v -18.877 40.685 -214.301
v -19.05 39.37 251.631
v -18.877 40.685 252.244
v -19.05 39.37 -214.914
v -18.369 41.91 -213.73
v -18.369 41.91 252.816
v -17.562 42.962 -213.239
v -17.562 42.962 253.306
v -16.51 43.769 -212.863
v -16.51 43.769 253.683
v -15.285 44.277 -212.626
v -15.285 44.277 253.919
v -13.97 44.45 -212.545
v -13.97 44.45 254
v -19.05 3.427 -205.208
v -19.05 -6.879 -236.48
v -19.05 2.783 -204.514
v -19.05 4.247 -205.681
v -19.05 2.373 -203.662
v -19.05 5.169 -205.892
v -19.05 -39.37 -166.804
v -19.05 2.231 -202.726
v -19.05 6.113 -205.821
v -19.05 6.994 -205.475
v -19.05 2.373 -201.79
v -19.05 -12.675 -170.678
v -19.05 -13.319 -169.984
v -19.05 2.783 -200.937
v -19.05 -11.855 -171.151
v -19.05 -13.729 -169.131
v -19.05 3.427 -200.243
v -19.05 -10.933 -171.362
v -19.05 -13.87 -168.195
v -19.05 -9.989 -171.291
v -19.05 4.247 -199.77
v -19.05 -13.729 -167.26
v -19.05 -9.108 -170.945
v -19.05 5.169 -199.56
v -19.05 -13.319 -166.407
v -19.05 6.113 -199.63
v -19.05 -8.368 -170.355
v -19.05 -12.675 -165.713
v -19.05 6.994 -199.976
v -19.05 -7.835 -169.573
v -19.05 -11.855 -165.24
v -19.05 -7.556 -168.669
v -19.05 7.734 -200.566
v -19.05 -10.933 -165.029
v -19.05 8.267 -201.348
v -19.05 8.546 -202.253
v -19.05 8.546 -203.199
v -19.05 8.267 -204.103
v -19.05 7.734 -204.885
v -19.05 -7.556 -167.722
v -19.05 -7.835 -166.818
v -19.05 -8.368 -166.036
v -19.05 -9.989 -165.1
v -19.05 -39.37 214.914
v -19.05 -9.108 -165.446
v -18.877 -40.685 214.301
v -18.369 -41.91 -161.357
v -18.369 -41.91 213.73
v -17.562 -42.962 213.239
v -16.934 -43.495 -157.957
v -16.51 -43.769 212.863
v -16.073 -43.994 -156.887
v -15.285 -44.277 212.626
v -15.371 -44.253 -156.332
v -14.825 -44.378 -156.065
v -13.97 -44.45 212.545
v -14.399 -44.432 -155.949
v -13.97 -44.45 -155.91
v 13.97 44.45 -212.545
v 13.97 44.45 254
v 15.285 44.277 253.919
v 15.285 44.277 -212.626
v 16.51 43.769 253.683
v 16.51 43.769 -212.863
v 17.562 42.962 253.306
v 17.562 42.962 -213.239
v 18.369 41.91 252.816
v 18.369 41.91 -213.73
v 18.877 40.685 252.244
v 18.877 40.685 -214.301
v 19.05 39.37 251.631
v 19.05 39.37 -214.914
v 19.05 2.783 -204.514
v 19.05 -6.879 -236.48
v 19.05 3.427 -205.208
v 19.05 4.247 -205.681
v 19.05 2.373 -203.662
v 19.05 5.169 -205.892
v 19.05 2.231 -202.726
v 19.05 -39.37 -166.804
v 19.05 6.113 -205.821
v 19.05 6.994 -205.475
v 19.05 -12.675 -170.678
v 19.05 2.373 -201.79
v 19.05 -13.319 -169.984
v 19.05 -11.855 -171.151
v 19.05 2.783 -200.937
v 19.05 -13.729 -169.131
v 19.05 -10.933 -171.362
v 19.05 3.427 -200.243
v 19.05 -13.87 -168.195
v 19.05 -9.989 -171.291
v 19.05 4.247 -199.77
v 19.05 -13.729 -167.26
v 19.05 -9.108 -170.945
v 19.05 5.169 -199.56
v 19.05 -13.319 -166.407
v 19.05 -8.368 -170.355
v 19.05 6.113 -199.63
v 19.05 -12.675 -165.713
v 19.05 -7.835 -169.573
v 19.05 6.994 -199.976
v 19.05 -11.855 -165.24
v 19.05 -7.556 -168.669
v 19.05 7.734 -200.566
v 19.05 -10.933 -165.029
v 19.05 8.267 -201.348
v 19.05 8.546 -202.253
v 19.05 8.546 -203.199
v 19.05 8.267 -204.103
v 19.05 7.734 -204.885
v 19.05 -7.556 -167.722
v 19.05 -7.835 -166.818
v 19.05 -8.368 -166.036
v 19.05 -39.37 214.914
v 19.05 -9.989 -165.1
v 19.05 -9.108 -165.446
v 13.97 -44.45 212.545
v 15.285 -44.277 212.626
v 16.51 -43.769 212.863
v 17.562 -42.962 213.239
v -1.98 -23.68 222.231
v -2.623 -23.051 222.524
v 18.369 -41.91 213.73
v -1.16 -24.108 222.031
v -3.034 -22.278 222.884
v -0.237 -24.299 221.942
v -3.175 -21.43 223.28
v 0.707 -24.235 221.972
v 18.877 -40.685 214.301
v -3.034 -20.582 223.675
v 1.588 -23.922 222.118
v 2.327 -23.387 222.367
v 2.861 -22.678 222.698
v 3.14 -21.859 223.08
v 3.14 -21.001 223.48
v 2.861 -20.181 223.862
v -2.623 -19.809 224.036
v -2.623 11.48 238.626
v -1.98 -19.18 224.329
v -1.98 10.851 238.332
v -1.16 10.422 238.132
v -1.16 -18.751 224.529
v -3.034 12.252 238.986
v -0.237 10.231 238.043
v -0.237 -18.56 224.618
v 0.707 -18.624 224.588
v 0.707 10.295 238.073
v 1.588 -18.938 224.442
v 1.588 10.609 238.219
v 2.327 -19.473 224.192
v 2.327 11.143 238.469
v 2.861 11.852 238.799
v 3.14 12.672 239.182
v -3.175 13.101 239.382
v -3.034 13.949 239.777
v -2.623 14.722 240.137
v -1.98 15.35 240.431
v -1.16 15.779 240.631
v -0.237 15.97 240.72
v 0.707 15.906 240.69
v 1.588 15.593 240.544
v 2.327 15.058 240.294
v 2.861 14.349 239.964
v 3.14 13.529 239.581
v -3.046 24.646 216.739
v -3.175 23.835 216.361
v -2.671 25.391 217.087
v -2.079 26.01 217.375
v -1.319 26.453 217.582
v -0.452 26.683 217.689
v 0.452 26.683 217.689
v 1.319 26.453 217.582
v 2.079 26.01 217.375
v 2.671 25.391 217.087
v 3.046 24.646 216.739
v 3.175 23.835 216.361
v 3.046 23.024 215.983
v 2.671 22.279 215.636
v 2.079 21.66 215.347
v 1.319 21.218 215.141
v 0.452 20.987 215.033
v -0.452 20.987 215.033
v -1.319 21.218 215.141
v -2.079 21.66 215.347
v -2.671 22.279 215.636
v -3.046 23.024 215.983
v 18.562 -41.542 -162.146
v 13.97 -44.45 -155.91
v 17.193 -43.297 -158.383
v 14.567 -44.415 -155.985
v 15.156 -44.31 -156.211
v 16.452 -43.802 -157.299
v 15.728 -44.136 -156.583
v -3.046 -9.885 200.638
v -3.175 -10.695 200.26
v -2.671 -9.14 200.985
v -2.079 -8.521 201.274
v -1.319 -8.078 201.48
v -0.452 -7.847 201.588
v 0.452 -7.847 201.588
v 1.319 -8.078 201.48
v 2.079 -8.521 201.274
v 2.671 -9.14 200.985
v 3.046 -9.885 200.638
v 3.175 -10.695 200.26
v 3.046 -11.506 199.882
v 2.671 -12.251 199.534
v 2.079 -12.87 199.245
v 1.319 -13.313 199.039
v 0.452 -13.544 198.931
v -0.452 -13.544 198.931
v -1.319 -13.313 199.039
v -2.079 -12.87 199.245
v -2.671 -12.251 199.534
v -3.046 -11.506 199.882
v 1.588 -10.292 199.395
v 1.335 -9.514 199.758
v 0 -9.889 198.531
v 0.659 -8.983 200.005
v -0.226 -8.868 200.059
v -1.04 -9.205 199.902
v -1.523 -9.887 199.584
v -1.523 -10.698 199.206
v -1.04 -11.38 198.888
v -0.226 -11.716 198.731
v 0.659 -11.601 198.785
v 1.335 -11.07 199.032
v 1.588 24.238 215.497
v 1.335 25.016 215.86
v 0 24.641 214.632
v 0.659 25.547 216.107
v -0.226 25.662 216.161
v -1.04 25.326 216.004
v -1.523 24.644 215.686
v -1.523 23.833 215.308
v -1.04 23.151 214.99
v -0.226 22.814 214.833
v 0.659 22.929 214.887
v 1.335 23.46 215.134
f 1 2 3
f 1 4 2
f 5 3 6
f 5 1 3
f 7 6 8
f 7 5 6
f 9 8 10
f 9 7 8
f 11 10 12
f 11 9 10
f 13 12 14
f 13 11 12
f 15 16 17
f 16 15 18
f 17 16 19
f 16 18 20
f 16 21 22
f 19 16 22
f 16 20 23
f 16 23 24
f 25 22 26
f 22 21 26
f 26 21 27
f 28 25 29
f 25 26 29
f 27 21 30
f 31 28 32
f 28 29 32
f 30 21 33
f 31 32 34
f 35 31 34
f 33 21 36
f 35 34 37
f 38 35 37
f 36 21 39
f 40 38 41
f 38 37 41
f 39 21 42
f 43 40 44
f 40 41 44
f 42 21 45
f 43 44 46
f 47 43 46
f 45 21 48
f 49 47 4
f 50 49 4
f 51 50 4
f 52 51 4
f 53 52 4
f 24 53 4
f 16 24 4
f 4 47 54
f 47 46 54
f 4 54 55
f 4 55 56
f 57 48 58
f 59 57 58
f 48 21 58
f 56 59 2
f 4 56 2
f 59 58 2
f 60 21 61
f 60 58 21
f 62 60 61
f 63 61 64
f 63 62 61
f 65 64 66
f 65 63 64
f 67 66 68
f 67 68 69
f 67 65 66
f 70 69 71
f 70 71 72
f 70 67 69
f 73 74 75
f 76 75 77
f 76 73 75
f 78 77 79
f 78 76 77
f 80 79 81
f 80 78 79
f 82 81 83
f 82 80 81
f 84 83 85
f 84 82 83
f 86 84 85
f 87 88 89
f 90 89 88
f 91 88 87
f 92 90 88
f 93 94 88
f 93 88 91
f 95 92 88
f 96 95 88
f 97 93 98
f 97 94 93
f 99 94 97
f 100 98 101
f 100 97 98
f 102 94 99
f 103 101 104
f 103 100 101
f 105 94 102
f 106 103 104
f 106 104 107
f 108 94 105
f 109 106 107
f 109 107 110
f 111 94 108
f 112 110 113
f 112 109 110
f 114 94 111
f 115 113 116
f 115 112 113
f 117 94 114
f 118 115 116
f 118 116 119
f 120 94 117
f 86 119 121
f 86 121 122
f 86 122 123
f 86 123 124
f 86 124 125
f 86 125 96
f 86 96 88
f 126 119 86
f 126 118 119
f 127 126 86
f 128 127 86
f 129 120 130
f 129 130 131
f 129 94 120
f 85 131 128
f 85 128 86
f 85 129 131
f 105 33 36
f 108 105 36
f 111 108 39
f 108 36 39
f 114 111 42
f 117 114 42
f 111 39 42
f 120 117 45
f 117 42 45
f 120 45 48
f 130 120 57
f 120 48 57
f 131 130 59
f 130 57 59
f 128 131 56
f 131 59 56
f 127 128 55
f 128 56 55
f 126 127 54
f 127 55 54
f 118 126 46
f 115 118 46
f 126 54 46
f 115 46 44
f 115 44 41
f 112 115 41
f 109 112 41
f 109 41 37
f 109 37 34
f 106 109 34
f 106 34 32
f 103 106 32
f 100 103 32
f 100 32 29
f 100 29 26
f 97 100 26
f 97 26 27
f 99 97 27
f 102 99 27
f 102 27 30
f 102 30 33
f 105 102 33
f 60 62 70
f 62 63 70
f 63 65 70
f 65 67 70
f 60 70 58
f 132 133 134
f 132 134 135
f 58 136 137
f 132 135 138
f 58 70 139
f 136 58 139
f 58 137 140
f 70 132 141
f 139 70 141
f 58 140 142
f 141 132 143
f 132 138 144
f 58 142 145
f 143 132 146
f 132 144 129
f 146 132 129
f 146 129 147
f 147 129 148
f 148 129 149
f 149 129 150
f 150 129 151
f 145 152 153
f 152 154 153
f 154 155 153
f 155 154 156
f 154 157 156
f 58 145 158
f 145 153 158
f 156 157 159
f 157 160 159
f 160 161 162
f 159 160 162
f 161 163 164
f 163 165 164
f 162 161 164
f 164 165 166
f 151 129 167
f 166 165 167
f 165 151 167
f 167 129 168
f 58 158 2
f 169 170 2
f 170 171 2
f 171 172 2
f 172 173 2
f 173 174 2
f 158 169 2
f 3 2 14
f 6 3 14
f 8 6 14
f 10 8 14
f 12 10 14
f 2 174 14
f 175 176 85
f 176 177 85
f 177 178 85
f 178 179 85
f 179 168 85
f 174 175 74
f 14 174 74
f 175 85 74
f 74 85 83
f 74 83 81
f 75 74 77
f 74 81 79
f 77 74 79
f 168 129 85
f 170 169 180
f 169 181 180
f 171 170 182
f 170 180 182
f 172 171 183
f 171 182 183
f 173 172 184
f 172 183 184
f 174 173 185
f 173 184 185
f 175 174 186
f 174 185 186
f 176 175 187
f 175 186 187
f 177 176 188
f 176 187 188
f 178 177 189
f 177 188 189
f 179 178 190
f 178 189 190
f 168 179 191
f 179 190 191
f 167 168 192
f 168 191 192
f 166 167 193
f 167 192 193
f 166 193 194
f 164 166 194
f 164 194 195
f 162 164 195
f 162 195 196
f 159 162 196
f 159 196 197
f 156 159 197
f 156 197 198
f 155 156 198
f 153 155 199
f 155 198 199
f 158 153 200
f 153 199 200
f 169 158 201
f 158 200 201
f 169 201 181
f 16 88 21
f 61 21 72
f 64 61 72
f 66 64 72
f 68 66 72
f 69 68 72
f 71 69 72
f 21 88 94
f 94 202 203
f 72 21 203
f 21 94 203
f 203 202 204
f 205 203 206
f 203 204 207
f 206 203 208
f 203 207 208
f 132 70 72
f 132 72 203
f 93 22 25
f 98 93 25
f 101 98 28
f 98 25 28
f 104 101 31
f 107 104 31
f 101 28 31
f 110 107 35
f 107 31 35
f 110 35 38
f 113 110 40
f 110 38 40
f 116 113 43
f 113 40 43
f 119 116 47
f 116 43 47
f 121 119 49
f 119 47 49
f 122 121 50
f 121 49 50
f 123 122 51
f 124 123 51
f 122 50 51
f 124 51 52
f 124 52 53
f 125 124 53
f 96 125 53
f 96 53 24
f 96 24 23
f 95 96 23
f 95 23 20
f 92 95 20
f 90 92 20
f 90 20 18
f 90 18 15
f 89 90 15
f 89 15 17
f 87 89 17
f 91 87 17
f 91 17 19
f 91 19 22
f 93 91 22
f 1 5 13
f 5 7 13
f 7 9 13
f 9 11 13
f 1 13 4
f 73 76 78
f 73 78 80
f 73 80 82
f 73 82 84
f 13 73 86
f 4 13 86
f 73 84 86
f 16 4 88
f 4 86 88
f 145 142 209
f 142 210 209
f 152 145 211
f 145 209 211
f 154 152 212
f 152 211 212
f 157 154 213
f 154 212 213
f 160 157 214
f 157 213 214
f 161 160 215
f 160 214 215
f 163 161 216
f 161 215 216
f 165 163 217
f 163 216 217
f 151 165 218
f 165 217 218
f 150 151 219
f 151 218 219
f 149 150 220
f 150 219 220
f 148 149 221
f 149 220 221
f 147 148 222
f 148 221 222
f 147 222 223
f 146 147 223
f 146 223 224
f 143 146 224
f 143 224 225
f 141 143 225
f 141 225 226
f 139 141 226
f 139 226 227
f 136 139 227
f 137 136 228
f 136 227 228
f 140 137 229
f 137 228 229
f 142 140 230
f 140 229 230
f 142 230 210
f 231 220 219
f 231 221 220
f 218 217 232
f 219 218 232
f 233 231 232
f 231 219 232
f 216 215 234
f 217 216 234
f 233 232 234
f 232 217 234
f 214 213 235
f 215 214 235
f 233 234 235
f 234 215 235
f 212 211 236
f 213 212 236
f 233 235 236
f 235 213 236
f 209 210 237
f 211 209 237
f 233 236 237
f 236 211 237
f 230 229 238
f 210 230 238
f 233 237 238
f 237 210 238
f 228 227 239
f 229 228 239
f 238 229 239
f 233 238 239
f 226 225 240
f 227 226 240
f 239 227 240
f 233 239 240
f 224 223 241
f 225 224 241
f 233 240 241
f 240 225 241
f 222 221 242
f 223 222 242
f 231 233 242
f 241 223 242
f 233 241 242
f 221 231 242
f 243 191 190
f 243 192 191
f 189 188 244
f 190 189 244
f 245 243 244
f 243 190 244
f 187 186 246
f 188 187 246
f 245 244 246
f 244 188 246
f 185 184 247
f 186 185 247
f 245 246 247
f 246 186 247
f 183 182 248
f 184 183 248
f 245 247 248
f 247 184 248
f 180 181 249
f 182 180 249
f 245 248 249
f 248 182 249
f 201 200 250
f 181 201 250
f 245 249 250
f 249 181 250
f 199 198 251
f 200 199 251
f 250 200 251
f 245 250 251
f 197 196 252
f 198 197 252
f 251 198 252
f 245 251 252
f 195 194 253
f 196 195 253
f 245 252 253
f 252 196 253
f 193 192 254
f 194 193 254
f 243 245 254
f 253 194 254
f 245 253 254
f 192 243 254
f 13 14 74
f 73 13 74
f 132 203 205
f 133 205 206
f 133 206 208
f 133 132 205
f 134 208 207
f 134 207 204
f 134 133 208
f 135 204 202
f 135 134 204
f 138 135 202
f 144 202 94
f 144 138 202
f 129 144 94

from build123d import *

# Parameters (mm, degrees)
F0_W     = 38.1
F0_H     = 88.9
F1_DEPTH = 254
F3_DEPTH = 38.101
F5_D     = 6.35
F6_R     = 5.08
F8_D     = 6.35
F8_DEPTH = 25.4
F8_TIP   = 1.9077324654


with BuildPart() as f1:
    # F0 (on Top) → F1 (new body, symmetric)
    with BuildSketch(Plane.XY):
        Rectangle(F0_W, F0_H)
    extrude(amount=F1_DEPTH, both=True)

    # F2 (on face) → F3 (cut, through all)
    with BuildSketch(Plane.YZ.offset(19.05)):
        Polygon((-44.45, 254), (-44.45, 212.54524919), (44.45, 254), align=None)
        Polygon((-6.8792365313, -236.4804652718), (-44.45, -254), (44.45, -254), (44.45, -212.54524919), align=None)
        Polygon((-44.45, -155.9097030042), (-44.45, -254), (-6.8792365313, -236.4804652718), align=None)
    extrude(amount=-F3_DEPTH, mode=Mode.SUBTRACT)

    # F5 (through all)
    with Locations(Plane.YZ.offset(19.05)):
        with Locations((-10.6952783611, -168.1954169468), (5.4064774113, -202.7257436328)):
            Hole(F5_D / 2)

    # F6
    f6_edges = [f1.edges().sort_by_distance(p)[0] for p in [
        (19.05, -44.45, 28.317773),
        (-19.05, -44.45, 28.317773),
        (19.05, 44.45, 20.727375),
        (-19.05, 44.45, 20.727375),
    ]]
    fillet(f6_edges, radius=F6_R)

    # F8
    with Locations(Plane(origin=(0, -89.3485989014, 191.6086886819), x_dir=(1, 0, 0), z_dir=(0, -0.4226182617, 0.906307787))):
        with Locations((0, 113.0401226202), (0, 74.9401226202)):
            Hole(F8_D / 2, depth=F8_DEPTH)
            with Locations((0, 0, -(F8_DEPTH + F8_TIP / 2))):  # 118° drill point
                Cone(0, F8_D / 2, F8_TIP, mode=Mode.SUBTRACT)


solid = f1.part
